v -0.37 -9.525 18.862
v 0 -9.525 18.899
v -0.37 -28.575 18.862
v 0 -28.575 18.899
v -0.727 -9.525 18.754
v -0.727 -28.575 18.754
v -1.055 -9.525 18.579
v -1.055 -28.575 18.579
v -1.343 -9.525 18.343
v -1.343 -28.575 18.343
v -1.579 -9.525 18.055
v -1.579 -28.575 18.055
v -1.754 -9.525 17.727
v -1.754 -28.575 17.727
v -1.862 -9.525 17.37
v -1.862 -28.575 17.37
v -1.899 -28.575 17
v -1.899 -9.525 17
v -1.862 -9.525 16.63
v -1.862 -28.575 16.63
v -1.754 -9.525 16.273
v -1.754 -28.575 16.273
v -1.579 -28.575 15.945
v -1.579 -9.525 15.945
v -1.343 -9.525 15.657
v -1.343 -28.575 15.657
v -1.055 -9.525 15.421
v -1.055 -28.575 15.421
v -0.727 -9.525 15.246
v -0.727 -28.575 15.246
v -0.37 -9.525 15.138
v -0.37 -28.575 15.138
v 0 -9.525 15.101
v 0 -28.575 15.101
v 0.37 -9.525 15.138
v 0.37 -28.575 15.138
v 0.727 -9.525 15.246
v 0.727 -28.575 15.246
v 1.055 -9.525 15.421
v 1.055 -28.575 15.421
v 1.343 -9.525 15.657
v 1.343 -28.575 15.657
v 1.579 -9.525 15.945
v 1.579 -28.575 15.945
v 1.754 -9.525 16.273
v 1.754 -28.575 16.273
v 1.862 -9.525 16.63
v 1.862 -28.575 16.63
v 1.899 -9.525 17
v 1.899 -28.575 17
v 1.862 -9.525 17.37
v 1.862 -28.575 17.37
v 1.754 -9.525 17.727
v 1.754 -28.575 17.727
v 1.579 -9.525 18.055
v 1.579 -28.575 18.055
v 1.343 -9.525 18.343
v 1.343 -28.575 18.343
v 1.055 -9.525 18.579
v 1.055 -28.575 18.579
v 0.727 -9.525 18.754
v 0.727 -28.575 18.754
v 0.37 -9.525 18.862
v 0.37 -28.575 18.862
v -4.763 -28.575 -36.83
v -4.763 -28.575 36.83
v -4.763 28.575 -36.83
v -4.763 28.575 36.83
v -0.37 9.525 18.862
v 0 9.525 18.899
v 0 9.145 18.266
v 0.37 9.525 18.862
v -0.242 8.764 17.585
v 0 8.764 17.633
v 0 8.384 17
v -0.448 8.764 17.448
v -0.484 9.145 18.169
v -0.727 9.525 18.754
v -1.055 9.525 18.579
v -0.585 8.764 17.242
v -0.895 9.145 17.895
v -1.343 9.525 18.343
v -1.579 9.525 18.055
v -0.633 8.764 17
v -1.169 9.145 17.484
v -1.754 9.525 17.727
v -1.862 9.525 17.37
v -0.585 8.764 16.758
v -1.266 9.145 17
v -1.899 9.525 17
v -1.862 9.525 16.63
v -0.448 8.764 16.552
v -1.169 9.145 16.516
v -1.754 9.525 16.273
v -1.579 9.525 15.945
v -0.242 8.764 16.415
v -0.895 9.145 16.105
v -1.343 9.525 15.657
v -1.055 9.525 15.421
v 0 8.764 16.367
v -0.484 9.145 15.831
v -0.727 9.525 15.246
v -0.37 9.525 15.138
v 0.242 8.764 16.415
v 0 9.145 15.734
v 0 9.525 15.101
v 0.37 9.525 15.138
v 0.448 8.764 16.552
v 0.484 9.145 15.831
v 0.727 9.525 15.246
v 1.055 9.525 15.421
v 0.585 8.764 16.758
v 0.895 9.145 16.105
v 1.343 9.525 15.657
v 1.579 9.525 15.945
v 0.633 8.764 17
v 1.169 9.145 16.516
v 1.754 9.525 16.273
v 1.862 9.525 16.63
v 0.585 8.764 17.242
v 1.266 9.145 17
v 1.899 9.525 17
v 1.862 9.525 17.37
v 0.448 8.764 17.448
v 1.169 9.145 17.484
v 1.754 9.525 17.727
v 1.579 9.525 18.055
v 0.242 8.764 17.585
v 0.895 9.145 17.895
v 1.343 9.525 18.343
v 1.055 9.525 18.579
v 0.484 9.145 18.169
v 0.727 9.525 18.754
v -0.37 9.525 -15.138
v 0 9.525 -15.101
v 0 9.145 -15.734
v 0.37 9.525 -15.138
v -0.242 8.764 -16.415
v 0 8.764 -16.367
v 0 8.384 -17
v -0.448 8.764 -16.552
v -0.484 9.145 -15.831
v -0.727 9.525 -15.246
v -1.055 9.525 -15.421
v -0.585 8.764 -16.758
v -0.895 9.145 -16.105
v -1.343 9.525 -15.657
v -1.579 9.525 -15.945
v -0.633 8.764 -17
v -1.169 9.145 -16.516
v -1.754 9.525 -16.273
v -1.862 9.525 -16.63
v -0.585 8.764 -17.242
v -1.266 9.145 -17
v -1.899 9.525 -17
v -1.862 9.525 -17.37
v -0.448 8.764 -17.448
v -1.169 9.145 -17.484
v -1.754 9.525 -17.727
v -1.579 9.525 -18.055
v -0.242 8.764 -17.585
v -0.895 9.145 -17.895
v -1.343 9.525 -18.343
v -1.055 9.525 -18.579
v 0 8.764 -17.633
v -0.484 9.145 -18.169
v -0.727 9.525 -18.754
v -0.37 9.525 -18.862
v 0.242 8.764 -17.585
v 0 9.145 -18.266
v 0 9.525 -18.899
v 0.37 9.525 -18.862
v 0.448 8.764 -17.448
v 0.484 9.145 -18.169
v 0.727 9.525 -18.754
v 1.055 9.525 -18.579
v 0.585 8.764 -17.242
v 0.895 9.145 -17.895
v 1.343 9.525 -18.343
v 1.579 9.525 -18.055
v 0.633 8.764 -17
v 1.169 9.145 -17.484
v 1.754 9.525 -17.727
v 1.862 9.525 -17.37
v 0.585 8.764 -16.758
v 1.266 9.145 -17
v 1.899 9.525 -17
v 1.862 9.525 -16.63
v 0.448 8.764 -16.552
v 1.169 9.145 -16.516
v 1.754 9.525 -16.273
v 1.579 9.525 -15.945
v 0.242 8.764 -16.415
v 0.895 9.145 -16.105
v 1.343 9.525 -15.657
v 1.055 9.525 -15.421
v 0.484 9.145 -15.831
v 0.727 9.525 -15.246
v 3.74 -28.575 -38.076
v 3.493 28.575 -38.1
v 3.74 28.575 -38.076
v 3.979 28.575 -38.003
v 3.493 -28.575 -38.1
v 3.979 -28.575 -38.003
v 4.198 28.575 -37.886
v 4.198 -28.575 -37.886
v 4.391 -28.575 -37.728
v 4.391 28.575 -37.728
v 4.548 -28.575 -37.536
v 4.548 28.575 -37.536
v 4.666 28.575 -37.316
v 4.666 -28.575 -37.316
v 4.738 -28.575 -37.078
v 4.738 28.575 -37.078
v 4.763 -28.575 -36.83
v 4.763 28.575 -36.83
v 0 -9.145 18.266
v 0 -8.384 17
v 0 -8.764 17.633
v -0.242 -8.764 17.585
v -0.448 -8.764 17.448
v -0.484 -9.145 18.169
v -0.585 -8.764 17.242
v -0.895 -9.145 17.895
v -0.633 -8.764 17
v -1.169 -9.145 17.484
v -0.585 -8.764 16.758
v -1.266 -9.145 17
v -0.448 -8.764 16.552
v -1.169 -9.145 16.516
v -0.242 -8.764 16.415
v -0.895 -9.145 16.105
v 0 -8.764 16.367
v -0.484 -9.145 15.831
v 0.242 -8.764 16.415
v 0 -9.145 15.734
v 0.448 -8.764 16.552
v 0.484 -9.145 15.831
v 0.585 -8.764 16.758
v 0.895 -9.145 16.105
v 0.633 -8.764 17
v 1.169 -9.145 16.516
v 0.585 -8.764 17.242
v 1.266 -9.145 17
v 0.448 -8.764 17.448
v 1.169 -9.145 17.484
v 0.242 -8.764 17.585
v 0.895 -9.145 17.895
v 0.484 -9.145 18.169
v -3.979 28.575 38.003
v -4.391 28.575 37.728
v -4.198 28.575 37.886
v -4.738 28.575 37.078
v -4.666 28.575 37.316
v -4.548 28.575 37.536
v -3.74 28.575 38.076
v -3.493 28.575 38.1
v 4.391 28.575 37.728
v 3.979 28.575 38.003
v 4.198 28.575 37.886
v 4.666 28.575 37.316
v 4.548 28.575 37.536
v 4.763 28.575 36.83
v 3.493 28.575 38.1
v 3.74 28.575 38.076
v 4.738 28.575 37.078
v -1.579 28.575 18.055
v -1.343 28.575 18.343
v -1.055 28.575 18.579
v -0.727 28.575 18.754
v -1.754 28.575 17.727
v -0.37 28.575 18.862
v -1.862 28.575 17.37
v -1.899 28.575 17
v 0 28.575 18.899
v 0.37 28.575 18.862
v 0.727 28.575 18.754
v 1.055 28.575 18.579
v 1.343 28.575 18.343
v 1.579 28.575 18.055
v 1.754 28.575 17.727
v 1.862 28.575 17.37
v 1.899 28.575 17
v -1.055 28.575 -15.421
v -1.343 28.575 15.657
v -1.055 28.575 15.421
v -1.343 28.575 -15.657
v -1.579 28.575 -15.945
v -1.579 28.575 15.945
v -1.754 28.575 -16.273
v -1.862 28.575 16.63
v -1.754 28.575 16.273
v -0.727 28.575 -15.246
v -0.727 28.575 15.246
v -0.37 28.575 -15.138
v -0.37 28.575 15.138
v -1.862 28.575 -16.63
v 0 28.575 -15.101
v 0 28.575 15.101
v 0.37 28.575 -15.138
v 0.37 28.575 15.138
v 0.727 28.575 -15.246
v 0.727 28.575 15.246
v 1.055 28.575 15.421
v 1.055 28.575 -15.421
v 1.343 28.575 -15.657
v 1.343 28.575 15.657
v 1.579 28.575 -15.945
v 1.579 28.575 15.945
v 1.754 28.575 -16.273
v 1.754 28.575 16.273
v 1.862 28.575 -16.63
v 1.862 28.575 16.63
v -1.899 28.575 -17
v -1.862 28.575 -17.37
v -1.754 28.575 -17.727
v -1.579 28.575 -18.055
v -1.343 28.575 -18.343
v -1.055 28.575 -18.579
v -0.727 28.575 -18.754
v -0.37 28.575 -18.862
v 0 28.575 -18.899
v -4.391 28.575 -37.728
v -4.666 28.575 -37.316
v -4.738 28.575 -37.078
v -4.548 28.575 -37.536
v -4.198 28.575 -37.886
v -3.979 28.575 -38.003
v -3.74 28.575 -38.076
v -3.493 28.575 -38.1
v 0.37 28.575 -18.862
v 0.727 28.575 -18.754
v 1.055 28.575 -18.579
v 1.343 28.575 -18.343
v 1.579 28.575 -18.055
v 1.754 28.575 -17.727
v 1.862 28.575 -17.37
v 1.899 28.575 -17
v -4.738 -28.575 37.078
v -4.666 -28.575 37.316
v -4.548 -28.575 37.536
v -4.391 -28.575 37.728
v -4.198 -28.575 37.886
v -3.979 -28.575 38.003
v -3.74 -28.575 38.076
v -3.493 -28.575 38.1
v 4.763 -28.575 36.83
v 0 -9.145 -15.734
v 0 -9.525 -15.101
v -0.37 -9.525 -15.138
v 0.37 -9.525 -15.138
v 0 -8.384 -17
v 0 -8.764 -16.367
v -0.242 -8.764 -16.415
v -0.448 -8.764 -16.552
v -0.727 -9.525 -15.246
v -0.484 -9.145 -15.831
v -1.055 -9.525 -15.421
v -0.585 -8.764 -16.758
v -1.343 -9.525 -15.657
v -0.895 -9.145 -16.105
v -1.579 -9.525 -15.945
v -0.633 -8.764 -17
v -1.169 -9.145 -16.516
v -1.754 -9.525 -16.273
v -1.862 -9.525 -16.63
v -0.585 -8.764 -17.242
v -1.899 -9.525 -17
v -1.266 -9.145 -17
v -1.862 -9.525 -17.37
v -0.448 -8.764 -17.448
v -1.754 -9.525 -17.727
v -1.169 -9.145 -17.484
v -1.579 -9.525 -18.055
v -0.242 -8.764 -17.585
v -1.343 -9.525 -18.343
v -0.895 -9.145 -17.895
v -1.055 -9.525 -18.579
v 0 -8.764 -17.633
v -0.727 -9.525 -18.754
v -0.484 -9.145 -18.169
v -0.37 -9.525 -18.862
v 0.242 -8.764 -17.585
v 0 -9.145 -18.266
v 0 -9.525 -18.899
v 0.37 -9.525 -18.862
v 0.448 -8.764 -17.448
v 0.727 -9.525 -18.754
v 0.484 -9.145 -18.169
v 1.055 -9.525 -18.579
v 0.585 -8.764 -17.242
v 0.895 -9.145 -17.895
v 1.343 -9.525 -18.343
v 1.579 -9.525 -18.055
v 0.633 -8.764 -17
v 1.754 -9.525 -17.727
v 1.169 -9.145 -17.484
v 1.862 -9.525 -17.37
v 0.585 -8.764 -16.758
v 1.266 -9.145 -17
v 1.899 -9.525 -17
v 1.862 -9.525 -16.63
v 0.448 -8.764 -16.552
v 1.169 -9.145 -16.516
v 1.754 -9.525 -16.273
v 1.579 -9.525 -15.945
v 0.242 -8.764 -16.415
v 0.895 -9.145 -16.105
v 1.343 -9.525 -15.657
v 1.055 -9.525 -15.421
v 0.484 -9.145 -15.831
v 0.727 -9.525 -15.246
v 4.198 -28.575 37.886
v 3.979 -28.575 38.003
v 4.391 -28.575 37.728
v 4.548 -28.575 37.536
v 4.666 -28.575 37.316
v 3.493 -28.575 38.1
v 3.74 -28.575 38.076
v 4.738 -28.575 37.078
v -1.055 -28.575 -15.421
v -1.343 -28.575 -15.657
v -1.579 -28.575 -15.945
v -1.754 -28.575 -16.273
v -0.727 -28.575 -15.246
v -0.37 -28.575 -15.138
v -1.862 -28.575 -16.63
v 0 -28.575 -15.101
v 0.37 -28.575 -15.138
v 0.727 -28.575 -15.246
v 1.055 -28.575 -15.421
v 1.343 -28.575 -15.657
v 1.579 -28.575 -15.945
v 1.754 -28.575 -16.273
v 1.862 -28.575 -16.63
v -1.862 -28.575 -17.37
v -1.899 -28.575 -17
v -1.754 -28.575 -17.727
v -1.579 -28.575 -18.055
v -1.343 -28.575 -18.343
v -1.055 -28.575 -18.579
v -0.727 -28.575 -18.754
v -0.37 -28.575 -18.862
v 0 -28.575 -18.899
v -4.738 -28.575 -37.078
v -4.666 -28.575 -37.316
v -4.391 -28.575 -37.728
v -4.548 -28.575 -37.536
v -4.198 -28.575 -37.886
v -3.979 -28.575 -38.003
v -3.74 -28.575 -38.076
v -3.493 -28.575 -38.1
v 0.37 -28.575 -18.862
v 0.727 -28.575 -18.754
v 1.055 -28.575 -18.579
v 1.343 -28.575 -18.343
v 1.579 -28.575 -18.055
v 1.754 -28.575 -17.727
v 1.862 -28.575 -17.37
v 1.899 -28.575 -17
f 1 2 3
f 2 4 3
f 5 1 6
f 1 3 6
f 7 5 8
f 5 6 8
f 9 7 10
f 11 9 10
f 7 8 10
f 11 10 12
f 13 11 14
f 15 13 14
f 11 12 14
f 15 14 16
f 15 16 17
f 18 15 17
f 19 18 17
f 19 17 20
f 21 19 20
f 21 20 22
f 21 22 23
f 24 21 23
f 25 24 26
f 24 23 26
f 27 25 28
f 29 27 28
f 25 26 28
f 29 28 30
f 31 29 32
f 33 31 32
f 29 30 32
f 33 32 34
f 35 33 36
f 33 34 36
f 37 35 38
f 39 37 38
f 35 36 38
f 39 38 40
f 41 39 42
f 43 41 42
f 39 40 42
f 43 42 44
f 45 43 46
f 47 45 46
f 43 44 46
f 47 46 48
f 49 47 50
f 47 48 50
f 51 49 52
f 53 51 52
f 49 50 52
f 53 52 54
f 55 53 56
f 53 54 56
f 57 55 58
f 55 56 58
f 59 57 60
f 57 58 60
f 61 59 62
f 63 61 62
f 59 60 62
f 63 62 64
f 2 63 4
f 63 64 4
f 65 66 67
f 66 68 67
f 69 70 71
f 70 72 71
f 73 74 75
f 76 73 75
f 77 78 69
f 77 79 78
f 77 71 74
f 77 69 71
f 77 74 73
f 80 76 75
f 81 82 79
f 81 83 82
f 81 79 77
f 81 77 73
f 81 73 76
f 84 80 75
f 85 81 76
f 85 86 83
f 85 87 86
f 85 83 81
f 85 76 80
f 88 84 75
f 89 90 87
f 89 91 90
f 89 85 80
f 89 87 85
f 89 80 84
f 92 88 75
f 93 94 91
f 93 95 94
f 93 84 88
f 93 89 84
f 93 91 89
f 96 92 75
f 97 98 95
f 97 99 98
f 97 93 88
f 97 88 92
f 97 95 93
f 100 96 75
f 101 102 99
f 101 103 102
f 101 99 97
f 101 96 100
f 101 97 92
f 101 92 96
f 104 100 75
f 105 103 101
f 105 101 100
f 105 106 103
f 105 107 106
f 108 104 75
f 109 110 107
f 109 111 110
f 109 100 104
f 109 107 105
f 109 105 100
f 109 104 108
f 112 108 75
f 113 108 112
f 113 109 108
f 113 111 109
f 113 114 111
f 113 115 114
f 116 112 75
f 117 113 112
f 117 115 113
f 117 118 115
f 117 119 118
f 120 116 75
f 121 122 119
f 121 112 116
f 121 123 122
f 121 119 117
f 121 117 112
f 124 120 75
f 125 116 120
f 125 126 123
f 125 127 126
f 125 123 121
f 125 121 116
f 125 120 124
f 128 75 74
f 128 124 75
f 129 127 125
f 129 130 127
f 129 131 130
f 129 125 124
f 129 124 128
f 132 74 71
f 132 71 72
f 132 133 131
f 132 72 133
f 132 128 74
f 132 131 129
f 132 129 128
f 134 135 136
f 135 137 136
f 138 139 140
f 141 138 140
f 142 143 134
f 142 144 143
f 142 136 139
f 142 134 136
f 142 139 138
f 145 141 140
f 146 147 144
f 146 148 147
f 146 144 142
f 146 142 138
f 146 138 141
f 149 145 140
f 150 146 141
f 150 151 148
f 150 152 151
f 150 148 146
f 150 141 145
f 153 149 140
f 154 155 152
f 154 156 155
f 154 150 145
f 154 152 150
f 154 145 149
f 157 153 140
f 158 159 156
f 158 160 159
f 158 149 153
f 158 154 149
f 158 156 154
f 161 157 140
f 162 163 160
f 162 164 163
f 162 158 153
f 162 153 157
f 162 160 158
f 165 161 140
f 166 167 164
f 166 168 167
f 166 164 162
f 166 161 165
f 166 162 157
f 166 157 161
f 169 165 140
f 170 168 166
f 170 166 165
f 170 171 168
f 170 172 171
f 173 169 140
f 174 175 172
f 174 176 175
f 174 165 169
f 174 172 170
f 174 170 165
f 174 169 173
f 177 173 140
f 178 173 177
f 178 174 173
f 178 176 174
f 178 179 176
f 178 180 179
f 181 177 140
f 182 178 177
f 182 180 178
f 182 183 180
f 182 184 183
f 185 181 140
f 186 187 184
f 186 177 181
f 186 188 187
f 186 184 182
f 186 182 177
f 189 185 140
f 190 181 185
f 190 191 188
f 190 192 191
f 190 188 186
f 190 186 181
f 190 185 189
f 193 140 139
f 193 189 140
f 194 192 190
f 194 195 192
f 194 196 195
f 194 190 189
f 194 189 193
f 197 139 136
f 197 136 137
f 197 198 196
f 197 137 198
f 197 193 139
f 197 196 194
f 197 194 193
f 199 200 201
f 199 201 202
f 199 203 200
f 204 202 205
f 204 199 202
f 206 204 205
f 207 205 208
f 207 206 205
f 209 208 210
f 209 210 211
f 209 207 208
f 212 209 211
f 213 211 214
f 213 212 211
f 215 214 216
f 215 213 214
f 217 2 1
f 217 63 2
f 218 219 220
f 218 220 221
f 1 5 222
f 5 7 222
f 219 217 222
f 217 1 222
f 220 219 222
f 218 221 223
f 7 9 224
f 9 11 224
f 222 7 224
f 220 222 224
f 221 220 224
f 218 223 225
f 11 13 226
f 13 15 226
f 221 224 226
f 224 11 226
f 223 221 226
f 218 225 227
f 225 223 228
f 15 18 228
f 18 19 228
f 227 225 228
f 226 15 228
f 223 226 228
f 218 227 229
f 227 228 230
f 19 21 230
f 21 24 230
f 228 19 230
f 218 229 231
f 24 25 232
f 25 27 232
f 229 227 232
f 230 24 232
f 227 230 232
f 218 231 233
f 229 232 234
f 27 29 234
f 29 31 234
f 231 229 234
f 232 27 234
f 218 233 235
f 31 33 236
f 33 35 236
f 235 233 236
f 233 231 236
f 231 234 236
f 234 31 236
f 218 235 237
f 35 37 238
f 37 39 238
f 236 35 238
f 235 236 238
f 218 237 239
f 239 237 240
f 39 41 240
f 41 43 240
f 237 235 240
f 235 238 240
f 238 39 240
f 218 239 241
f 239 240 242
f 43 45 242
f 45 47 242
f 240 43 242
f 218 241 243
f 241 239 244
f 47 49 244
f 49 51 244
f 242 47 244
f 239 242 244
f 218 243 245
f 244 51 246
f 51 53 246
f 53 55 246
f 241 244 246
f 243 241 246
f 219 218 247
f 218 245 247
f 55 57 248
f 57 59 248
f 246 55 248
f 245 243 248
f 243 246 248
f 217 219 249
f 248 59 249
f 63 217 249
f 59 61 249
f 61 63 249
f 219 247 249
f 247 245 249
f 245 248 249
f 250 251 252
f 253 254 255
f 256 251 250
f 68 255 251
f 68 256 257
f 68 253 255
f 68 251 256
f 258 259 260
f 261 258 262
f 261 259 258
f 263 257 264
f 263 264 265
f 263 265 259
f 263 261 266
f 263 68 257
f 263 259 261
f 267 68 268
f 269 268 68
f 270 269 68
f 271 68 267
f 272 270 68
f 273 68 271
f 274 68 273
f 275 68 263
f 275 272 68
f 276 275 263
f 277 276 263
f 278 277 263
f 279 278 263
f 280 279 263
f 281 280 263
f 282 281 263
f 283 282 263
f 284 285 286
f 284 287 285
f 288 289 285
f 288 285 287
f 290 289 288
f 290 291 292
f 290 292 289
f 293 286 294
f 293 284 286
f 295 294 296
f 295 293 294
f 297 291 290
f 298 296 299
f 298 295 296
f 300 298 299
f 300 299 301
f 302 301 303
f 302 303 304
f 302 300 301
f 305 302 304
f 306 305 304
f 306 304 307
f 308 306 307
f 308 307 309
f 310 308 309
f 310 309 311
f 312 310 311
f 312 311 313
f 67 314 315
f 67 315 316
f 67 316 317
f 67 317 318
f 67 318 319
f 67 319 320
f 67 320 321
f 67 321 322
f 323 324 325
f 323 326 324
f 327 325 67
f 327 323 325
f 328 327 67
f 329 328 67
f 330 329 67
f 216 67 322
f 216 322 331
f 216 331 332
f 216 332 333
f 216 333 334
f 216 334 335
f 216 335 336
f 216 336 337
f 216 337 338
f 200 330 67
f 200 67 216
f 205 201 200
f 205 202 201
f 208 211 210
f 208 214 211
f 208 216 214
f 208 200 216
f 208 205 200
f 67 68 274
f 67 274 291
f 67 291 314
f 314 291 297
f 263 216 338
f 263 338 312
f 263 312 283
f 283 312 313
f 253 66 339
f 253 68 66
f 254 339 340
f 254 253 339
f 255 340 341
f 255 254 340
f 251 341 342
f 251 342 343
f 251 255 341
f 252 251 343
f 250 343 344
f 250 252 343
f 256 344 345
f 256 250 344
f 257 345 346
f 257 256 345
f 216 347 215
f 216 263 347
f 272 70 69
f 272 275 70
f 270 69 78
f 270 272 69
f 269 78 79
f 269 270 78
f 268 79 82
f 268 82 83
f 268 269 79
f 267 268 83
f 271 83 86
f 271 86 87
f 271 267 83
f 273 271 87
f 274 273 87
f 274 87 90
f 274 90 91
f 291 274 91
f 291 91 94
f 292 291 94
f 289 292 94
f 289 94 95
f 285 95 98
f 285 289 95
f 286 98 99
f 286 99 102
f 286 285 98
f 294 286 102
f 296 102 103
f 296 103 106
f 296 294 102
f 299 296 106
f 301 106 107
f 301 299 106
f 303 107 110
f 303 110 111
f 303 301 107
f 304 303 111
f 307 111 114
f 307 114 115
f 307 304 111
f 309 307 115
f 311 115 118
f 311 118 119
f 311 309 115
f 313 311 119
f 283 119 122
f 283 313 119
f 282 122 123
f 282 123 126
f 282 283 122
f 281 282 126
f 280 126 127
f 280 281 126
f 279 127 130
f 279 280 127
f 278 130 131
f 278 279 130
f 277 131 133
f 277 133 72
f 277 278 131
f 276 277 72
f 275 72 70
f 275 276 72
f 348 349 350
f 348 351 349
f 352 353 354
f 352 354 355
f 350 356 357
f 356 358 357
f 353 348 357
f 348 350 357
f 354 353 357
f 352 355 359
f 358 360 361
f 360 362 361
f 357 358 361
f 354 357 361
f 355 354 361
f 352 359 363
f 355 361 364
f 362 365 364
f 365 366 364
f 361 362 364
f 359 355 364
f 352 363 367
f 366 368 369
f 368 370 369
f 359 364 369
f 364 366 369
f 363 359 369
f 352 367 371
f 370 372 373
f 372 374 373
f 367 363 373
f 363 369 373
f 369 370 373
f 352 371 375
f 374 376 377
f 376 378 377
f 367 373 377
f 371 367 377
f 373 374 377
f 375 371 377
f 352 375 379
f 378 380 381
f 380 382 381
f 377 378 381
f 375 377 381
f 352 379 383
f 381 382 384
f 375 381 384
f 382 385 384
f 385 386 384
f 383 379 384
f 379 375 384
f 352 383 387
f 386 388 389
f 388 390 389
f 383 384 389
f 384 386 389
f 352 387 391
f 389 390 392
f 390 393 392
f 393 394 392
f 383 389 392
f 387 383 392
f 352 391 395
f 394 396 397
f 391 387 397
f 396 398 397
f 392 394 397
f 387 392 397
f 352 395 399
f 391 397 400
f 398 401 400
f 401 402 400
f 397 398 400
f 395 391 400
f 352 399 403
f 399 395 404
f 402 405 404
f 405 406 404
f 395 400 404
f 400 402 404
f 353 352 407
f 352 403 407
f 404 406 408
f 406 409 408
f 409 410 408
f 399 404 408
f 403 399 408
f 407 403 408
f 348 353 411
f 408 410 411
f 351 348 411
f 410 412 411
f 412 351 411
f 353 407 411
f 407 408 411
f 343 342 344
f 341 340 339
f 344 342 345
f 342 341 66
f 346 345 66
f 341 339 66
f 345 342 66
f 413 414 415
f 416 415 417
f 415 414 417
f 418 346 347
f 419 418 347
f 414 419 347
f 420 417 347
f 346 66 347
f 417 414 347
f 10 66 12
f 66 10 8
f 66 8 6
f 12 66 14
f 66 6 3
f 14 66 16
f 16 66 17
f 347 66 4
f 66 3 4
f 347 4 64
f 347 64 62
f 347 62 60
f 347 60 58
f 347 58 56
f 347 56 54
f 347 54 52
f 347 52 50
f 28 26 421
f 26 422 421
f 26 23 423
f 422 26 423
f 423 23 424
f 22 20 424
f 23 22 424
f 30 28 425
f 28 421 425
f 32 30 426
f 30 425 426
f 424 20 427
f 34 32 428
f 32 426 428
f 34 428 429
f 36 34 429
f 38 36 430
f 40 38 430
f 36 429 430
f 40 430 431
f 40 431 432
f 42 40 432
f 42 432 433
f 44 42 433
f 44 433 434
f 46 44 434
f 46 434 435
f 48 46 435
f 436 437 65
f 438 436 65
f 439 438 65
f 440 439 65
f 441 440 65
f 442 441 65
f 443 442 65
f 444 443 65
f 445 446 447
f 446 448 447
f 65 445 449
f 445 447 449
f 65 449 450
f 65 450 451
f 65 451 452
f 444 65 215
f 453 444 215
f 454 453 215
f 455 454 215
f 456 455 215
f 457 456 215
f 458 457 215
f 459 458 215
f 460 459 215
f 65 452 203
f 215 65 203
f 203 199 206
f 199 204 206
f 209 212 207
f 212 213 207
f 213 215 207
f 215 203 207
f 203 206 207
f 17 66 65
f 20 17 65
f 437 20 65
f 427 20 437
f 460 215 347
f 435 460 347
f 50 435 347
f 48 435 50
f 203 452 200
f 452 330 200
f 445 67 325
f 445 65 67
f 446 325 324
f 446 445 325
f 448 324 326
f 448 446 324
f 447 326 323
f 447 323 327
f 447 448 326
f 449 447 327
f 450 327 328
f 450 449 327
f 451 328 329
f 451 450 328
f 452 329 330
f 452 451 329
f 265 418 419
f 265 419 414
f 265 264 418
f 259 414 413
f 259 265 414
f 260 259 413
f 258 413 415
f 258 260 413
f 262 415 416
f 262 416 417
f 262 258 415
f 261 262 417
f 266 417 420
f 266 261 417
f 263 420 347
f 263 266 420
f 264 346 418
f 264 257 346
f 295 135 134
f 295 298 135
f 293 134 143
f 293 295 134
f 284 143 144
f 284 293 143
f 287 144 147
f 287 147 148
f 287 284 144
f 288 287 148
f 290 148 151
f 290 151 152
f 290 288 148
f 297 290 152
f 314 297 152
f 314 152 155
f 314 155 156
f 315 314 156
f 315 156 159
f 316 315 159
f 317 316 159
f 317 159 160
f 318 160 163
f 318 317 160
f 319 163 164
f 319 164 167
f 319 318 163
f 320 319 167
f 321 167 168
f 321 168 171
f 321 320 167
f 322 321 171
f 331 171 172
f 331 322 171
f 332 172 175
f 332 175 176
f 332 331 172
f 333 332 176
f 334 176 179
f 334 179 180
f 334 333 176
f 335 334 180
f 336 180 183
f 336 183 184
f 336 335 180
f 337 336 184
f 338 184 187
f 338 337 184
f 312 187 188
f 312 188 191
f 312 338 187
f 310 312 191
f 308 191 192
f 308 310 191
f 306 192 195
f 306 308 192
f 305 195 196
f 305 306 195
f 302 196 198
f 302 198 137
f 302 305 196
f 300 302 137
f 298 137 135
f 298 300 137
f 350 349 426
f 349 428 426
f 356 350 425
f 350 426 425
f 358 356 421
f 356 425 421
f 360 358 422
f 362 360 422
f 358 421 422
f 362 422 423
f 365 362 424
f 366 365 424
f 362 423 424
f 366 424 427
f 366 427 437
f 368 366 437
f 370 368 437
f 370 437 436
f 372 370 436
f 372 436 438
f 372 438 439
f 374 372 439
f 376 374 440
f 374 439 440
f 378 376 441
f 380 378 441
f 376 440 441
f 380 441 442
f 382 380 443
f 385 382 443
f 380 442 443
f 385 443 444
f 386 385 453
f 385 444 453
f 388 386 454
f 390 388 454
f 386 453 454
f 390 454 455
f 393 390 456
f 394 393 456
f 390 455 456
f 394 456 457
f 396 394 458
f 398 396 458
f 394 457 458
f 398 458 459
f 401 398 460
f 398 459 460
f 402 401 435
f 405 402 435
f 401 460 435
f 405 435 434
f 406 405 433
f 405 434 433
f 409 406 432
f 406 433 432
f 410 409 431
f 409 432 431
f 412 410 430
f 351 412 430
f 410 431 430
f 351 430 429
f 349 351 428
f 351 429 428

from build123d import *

# Parameters (mm, degrees)
SKETCH1_W                       = 9.525
SKETCH1_H                       = 76.2
BOSS_EXTRUDE1_DEPTH             = 28.575
F_10_24_TAPPED_HOLE1_AT_2_COUNT = 2
F_10_24_TAPPED_HOLE1_AT_2_PITCH = 34
FILLET1_R                       = 1.27


with BuildPart() as part:
    # Sketch1 → Boss-Extrude1 (new body, symmetric)
    with BuildSketch(Plane(origin=(0, 0, 0), x_dir=(1, 0, 0), z_dir=(0, 1, 0))):
        Rectangle(SKETCH1_W, SKETCH1_H)
    extrude(amount=BOSS_EXTRUDE1_DEPTH, both=True)

    # Sketch3 → #10-24 Tapped Hole1 (revolve, cut)
    with BuildSketch(Plane(origin=(0, 28.575, -17), x_dir=(0, 0, 1), z_dir=(1, 0, 0))):
        Polygon((0, 0), (0, 20.190824014), (1.89865, 19.05), (1.89865, 0), align=None)
    f_10_24_tapped_hole1 = revolve(axis=Axis((0, 34.925, -17), (0, -1, 0)), mode=Mode.SUBTRACT)

    # #10-24 Tapped Hole1 at 2: #10-24 Tapped Hole1 ×2
    with Locations(*[(0, 0, i * F_10_24_TAPPED_HOLE1_AT_2_PITCH) for i in range(1, F_10_24_TAPPED_HOLE1_AT_2_COUNT)]):
        add(f_10_24_tapped_hole1, mode=Mode.SUBTRACT)

    # Mirror1: #10-24 Tapped Hole1 across plane
    add(f_10_24_tapped_hole1.mirror(Plane.ZX), mode=Mode.SUBTRACT)

    # Mirror1 copy 1 sketch → Mirror1 copy 1 (revolve, cut)
    with BuildSketch(Plane(origin=(0, -28.575, 17), x_dir=(0, 0, 1), z_dir=(1, 0, 0))):
        Polygon((0, 0), (0, -20.190824014), (1.89865, -19.05), (1.89865, 0), align=None)
    revolve(axis=Axis((0, -34.925, 17), (0, -1, 0)), mode=Mode.SUBTRACT)

    # Fillet1
    fillet1_edges = [part.edges().sort_by_distance(p)[0] for p in [
        (-4.7625, 0, -38.1),
        (4.7625, 0, -38.1),
        (4.7625, 0, 38.1),
        (-4.7625, 0, 38.1),
    ]]
    fillet(fillet1_edges, radius=FILLET1_R)


solid = part.part
